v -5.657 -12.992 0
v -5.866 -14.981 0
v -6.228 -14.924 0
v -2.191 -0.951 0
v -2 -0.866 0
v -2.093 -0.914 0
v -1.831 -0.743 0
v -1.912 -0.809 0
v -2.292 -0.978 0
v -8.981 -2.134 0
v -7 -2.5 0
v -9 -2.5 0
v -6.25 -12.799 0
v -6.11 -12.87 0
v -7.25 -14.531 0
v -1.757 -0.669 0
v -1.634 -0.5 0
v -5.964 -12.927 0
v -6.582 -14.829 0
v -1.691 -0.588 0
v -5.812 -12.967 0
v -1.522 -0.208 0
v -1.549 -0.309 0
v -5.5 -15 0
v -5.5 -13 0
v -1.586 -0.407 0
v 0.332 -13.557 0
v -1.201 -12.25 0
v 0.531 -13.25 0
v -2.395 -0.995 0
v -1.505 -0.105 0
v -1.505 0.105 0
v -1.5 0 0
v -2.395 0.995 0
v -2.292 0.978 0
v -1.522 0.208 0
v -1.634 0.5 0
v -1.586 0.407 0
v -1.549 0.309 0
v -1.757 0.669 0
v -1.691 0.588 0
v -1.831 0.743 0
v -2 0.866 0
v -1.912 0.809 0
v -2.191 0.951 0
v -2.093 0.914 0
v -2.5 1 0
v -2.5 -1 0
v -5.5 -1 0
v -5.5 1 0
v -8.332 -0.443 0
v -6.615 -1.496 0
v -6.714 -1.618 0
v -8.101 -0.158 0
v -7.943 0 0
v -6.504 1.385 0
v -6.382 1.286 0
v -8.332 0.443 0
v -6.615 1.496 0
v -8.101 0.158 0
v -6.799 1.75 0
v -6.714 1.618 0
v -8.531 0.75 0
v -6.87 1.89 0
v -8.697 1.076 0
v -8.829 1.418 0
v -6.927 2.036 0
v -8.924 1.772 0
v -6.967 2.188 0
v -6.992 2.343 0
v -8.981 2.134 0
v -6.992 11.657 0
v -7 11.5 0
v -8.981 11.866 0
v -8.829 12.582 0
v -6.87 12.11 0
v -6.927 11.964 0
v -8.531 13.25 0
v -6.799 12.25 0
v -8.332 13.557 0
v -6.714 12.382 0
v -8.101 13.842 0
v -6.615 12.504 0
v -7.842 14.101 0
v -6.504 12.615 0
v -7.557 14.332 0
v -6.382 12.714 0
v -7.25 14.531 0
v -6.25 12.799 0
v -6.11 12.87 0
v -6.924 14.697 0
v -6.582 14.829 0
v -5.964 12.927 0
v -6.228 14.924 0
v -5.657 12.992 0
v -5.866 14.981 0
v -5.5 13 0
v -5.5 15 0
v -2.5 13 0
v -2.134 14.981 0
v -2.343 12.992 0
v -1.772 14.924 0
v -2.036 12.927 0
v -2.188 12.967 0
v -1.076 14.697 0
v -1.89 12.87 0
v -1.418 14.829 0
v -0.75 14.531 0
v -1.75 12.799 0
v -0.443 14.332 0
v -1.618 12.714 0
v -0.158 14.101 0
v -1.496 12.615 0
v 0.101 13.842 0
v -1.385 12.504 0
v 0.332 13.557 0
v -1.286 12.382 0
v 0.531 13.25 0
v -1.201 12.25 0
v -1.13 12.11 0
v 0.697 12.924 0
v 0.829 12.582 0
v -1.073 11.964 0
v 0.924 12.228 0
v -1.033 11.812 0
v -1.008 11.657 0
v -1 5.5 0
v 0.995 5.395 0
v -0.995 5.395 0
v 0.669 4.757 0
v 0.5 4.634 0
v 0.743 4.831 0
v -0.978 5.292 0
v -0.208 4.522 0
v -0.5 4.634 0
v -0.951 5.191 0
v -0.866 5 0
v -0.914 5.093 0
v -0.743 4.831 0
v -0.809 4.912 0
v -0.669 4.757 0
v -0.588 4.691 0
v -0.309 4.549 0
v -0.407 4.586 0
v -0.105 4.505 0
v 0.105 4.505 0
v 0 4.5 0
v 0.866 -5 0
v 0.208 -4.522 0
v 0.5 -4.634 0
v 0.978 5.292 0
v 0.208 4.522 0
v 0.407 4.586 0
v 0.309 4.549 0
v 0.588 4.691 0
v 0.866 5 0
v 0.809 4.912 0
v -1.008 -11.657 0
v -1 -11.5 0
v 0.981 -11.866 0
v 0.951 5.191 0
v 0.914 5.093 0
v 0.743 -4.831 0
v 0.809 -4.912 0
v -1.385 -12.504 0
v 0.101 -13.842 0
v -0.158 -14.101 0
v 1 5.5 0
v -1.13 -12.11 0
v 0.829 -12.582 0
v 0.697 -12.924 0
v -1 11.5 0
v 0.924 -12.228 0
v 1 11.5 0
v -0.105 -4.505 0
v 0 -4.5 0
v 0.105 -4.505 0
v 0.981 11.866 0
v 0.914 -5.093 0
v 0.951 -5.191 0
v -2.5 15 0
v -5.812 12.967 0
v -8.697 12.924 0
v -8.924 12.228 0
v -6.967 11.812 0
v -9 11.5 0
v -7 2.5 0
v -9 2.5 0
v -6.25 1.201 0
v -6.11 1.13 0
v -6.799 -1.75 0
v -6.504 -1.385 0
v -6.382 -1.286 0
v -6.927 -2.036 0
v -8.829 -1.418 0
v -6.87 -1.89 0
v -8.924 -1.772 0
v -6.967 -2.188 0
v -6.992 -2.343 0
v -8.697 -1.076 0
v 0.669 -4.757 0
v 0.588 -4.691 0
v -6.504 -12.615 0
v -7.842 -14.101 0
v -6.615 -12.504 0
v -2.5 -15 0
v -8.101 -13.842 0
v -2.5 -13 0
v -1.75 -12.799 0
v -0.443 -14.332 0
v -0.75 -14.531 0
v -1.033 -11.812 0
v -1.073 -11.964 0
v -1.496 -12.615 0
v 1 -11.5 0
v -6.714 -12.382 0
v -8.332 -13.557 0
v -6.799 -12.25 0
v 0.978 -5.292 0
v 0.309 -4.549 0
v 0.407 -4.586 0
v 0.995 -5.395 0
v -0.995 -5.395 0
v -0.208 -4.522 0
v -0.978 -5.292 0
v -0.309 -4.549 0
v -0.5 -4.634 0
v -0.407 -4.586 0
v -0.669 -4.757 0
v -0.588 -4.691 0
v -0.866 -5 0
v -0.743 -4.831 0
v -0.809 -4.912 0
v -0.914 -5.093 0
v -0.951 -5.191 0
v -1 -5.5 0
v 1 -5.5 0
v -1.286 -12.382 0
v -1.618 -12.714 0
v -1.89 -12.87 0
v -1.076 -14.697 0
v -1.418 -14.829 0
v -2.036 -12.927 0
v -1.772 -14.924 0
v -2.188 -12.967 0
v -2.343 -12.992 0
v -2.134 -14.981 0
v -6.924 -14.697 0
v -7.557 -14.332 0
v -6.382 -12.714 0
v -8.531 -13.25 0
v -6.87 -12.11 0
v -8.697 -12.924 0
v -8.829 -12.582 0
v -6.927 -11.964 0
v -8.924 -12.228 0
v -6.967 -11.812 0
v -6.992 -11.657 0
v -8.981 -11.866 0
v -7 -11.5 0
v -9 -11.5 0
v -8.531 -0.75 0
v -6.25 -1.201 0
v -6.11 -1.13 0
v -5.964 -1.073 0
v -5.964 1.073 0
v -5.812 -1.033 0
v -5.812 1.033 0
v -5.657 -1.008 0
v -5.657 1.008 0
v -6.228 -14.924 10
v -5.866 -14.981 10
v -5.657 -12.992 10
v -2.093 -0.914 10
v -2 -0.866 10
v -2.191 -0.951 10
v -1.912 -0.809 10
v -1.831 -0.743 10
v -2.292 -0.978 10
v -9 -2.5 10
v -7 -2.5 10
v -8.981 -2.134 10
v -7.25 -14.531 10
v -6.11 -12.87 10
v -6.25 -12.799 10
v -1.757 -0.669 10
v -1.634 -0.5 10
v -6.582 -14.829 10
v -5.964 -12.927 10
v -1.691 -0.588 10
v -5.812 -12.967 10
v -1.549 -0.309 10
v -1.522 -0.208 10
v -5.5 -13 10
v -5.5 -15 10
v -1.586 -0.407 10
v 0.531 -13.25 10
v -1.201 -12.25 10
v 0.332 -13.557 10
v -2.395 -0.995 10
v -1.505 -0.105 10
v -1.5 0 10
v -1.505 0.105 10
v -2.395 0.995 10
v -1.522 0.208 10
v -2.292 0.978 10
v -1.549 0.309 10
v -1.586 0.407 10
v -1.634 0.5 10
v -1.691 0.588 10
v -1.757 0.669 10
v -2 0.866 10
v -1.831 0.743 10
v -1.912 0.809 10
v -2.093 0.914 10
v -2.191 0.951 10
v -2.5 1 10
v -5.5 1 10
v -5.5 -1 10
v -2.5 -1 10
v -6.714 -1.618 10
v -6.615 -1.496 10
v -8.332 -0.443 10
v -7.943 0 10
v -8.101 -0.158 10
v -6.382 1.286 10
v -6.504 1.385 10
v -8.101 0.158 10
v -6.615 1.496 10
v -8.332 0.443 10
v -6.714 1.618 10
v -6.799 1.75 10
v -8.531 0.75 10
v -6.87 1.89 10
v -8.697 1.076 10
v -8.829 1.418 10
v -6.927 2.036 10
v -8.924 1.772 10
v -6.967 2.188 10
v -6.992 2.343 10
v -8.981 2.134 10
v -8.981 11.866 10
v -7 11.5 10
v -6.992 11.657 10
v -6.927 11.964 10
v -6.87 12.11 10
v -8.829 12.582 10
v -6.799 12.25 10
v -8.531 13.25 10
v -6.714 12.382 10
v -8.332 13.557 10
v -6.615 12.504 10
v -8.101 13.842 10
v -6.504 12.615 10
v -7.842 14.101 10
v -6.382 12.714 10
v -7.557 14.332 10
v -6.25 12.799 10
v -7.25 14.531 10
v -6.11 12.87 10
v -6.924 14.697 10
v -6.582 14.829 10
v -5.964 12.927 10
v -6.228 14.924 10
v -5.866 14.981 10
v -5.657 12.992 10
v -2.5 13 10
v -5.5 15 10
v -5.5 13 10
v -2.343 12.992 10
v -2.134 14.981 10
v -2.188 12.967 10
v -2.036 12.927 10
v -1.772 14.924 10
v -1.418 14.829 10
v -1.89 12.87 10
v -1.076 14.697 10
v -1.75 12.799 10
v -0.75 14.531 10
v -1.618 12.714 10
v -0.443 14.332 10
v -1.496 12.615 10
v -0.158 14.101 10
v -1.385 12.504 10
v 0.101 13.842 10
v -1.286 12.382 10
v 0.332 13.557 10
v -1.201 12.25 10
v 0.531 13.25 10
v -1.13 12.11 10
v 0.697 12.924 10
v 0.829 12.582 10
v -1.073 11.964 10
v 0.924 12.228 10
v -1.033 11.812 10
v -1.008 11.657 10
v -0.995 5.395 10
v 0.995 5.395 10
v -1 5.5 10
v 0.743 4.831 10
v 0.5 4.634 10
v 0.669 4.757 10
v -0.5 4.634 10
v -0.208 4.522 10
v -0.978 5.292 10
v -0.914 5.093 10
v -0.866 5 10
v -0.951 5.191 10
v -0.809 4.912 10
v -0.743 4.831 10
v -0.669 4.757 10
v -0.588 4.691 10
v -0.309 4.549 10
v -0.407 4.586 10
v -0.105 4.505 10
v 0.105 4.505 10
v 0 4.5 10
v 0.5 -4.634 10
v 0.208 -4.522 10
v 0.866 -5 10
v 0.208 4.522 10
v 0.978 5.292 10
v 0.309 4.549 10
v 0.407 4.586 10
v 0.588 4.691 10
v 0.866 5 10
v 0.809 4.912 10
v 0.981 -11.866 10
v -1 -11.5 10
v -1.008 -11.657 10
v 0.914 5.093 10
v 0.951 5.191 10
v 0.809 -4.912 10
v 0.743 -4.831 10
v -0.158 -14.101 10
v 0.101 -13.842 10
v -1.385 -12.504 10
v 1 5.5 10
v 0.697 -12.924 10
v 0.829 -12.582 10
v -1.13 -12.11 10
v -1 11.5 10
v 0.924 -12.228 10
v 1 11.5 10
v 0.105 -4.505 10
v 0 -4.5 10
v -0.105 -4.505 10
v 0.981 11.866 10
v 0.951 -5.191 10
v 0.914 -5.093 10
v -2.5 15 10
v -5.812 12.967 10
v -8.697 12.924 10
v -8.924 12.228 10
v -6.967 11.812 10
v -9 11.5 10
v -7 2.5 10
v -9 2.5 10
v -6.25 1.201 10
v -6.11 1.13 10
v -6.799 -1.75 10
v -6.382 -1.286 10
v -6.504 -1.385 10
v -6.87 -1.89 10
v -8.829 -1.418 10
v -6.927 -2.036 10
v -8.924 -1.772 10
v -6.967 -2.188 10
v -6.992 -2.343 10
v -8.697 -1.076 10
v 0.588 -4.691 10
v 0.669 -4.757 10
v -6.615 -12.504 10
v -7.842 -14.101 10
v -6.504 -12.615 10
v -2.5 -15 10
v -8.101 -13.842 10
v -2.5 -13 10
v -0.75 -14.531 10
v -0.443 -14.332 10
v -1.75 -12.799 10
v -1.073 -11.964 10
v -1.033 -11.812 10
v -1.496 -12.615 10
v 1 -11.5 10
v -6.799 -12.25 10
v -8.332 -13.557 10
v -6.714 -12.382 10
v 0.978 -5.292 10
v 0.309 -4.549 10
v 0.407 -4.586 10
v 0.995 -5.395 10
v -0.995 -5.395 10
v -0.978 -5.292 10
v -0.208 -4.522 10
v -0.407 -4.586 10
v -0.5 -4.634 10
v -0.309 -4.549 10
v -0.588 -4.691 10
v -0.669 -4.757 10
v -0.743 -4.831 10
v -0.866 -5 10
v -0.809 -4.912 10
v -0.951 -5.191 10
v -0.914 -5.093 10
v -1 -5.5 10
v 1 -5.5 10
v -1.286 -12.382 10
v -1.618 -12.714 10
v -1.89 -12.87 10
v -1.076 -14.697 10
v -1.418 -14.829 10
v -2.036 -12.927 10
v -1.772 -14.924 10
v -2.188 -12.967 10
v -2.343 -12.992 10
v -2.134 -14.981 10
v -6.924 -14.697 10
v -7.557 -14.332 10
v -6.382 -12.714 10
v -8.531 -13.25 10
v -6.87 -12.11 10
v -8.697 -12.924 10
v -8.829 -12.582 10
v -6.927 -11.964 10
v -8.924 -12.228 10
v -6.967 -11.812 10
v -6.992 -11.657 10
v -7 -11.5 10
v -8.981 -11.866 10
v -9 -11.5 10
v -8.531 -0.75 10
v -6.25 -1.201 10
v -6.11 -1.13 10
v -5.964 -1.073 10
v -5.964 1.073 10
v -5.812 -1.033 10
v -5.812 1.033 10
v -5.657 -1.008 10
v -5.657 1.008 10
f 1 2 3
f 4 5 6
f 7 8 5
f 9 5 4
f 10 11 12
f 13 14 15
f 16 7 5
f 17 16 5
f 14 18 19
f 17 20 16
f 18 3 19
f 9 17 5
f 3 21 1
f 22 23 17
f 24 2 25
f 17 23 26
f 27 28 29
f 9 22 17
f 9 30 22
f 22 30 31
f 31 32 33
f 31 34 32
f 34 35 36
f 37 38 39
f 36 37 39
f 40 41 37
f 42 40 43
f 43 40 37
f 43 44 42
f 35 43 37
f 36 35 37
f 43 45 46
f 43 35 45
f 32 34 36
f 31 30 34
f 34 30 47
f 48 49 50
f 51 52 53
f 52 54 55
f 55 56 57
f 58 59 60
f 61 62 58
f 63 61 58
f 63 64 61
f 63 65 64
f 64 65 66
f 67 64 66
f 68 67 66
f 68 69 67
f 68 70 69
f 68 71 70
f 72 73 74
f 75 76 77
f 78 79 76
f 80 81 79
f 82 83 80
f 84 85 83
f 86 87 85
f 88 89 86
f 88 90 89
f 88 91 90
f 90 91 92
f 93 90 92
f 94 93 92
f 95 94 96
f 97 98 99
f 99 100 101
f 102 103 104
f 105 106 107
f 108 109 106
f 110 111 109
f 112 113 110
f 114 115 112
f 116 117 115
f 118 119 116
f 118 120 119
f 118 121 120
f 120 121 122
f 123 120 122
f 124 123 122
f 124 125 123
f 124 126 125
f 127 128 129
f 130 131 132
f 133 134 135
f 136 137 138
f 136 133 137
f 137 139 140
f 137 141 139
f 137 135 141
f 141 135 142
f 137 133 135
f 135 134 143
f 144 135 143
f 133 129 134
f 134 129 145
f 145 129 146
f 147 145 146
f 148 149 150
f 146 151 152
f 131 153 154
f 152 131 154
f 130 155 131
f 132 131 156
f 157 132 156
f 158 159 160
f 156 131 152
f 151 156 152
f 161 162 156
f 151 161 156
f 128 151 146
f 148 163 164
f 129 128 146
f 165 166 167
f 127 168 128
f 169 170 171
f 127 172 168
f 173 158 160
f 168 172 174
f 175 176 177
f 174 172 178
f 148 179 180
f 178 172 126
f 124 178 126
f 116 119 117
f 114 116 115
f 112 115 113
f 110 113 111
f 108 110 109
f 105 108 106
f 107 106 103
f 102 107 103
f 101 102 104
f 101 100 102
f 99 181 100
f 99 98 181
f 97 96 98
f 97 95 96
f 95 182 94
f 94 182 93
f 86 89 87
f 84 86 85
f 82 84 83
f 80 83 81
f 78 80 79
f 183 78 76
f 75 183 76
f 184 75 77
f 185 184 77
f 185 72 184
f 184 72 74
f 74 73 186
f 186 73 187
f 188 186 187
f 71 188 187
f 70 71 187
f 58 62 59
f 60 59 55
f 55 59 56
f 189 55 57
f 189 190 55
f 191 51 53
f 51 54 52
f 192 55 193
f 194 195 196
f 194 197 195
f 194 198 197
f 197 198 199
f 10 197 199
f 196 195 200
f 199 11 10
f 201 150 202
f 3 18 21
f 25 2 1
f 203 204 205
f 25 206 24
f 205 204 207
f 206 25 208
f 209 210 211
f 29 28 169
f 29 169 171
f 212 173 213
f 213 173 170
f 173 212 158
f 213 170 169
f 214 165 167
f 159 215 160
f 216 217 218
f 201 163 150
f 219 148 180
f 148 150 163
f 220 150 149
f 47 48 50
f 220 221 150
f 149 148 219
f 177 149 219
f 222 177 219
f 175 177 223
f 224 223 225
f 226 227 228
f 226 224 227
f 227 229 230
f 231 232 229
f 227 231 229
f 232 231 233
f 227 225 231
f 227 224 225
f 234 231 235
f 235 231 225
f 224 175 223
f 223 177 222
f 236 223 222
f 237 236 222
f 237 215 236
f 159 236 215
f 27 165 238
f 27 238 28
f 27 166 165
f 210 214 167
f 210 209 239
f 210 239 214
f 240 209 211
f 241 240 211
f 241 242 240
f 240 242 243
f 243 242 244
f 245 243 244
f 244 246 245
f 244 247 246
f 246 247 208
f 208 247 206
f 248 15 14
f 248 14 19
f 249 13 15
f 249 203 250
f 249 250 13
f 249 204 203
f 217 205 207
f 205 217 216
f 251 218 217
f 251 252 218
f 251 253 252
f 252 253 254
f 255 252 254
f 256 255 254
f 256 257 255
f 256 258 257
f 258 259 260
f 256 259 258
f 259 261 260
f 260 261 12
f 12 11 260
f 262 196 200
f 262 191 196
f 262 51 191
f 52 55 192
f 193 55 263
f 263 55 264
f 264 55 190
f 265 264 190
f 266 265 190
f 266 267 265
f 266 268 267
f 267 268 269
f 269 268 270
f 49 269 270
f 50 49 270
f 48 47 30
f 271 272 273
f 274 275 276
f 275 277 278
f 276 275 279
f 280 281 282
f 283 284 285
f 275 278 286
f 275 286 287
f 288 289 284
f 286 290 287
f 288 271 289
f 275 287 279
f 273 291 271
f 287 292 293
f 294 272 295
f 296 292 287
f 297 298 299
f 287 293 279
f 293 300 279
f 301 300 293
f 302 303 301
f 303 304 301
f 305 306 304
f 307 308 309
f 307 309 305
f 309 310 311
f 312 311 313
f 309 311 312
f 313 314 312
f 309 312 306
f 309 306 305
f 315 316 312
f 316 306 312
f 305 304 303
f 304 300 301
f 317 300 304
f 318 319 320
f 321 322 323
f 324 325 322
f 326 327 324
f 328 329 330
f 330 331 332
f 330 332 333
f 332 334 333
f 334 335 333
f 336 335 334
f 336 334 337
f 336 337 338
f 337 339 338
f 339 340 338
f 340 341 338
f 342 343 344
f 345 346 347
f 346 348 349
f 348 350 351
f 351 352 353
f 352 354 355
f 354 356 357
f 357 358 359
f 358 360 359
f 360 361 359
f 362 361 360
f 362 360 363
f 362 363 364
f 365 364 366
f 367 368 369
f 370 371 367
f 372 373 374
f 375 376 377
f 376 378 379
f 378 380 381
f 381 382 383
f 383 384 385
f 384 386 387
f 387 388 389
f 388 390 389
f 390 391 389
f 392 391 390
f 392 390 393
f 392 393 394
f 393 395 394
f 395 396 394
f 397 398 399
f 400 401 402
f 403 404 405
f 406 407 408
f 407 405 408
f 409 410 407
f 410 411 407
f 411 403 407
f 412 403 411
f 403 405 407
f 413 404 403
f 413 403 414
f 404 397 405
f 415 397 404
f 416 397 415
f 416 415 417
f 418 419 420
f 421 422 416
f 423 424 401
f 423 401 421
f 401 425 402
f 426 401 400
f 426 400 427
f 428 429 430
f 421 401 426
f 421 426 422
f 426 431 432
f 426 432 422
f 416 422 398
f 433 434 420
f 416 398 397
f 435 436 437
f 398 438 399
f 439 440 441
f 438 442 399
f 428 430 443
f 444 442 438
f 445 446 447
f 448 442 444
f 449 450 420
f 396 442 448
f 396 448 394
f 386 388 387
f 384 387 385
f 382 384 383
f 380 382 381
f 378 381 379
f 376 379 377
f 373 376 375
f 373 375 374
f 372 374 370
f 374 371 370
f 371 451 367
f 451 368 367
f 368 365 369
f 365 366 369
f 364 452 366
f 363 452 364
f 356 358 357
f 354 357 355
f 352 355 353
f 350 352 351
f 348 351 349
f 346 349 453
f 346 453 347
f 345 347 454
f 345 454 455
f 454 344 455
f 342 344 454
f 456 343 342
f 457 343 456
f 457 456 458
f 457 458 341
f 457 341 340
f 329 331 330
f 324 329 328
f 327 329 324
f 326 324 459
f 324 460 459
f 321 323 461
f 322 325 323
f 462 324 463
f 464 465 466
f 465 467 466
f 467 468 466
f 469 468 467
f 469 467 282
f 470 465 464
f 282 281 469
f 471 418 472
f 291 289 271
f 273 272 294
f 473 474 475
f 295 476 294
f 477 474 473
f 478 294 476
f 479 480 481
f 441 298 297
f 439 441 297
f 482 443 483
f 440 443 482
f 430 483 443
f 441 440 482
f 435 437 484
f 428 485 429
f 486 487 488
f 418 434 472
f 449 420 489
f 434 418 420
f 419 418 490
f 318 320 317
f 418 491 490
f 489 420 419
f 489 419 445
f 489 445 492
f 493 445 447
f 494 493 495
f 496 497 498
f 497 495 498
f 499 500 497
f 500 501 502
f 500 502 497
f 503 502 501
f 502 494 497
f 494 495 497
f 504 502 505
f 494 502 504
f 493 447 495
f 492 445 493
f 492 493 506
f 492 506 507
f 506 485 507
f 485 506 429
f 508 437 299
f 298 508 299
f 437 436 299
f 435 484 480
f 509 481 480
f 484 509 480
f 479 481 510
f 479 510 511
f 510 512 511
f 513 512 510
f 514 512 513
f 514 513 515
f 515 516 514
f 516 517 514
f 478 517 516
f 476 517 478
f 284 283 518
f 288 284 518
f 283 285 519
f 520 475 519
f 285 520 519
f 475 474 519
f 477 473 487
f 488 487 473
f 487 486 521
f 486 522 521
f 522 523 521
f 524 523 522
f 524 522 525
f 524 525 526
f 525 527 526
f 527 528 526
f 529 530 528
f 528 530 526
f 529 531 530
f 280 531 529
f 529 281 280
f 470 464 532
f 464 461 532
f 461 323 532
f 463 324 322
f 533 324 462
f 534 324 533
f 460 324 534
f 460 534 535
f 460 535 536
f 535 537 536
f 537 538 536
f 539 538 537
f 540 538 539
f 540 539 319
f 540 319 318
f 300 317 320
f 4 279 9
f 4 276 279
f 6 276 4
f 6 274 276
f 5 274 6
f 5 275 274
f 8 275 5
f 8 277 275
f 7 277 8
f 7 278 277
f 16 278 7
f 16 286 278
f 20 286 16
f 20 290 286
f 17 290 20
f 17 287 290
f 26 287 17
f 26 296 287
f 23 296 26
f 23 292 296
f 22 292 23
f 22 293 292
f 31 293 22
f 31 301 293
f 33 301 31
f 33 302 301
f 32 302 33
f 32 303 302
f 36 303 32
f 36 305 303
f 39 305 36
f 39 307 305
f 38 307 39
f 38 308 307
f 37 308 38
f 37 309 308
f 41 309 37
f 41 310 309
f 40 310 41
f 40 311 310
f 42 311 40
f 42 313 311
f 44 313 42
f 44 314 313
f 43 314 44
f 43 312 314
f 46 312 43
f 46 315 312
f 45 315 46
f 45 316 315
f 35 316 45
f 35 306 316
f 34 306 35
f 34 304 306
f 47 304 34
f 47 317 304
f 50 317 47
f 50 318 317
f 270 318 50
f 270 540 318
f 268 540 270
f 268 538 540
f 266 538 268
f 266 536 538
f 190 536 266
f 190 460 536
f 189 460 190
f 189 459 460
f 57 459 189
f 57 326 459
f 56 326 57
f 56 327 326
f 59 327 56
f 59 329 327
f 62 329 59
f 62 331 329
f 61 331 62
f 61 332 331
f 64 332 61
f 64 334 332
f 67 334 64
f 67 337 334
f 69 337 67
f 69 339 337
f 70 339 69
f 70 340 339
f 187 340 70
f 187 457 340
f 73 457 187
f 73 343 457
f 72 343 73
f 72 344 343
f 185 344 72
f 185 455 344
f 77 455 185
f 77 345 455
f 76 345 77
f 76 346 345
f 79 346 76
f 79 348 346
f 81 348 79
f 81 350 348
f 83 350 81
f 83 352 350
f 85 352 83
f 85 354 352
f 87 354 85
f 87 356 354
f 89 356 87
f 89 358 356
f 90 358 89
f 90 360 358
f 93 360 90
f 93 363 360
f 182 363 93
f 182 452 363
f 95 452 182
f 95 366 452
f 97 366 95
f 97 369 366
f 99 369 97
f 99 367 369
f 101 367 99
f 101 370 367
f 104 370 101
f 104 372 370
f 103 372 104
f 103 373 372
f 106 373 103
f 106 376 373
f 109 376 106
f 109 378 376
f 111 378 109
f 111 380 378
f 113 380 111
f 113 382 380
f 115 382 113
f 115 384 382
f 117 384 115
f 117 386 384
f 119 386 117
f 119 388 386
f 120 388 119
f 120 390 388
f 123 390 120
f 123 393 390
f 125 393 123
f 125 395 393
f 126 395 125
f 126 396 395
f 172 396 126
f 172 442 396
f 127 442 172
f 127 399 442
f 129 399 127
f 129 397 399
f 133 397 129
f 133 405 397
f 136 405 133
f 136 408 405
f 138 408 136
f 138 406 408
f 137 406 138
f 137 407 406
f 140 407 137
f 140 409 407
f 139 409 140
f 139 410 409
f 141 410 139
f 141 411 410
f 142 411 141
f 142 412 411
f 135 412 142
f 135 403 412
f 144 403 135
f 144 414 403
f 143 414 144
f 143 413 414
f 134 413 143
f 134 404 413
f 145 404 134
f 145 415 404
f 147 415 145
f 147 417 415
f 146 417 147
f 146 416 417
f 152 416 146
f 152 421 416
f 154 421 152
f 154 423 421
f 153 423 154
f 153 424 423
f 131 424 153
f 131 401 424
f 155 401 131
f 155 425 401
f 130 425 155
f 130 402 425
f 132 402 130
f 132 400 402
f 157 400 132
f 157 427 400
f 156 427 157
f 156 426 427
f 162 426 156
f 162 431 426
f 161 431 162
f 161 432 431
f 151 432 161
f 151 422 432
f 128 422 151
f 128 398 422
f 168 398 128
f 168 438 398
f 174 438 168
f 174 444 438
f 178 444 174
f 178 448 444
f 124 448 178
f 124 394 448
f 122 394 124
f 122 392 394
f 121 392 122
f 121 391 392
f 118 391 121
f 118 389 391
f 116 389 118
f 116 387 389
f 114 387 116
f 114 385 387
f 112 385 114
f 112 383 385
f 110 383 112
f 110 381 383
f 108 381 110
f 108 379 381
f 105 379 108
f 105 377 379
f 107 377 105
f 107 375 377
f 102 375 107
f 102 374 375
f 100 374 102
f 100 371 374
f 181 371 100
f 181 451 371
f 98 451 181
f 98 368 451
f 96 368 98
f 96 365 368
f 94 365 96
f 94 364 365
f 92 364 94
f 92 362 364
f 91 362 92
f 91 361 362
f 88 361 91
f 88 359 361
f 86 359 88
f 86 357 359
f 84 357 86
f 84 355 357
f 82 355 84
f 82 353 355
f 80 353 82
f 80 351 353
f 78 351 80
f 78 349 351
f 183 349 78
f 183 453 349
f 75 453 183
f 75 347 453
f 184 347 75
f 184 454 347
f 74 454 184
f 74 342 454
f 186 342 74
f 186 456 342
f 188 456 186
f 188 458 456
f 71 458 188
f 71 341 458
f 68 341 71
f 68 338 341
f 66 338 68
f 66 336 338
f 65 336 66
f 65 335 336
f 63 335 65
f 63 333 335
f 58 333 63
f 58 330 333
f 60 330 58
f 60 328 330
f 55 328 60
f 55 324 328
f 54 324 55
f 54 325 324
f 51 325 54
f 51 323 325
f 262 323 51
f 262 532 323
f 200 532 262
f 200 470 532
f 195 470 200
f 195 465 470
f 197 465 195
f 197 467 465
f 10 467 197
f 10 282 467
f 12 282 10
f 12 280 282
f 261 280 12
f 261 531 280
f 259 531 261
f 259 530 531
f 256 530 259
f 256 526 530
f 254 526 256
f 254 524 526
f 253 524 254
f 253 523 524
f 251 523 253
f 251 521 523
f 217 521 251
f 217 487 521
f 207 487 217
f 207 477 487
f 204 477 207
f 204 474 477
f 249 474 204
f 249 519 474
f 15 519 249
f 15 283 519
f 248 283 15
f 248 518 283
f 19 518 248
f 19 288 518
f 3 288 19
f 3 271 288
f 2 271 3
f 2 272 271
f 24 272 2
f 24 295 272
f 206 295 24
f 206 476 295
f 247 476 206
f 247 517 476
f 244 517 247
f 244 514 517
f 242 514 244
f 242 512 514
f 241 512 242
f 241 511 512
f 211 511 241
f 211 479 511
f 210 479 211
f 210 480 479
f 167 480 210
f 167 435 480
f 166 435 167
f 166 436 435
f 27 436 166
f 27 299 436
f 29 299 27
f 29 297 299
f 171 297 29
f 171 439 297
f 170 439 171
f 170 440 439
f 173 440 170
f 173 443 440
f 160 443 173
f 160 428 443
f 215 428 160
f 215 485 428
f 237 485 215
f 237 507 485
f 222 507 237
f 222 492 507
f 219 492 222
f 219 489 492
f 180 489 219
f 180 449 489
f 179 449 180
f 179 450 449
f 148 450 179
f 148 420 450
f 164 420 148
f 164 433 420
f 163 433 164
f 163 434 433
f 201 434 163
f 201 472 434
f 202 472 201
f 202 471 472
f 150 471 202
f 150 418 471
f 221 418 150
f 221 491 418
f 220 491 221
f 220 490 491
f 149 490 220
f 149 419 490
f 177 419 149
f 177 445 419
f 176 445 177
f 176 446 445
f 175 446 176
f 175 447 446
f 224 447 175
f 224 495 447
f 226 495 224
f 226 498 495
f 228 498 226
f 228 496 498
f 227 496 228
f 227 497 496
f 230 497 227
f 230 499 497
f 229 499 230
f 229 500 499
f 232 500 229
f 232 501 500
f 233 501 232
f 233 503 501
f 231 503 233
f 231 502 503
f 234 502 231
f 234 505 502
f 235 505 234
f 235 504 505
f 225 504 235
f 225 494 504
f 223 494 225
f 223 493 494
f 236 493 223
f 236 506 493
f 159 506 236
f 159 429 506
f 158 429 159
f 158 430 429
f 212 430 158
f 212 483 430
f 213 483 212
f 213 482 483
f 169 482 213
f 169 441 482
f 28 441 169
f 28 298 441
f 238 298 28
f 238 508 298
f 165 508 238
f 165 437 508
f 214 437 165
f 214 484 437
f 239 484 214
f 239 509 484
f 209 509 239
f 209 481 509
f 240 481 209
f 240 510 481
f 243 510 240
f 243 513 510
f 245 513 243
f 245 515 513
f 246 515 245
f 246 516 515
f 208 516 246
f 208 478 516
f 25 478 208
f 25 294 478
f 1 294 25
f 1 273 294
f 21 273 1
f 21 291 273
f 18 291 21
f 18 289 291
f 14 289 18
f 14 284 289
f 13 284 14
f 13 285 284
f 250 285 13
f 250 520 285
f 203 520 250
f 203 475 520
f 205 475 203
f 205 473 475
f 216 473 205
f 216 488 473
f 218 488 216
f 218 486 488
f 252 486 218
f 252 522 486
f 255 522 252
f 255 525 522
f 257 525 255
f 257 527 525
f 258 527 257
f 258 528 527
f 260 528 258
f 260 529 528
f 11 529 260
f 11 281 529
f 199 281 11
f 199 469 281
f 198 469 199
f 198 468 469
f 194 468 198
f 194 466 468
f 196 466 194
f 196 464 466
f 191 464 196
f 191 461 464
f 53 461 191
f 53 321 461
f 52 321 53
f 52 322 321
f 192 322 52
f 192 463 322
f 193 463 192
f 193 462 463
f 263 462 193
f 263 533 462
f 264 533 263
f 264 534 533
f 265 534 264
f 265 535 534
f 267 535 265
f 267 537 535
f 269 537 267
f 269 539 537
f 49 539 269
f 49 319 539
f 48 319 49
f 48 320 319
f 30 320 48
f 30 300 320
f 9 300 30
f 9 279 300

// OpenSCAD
// ------------------
// Dec 2023 - Cubic8
// ------------------

/* [Cable Details] */

// Diameter of the cable in mm
cable_diameter = 3.0; // [1:0.1:6]

// Maximum loops of the cable that the clip is to hold
cable_max_loops = 4; // [2:1:20]

/* [Clip Dimentions] */

// Overall height of the clip in mm (ie. when printed on its edge)
clip_height = 10.0; // [1:1:50]

// Maximum outer width of clip in mm (ie. across the loops of cable). The depth will be adjusted to fit your required loops.
max_width = 30; // [20:0.5:80]

// Check if using flex filament. The cable gap will be smaller, and walls thicker.
using_flex = false;

// Check if the central space is to be a clip to grip onto the cable.
cable_grip = false;

/* [Hidden] */

// Thickness of walls in mm
// FLEX needs thicker walls
base_thickness = using_flex ? 2.0: 1.0;

// Add extra if we have a bigger clip
wall_thickness = base_thickness 
    + round(0.5 
        + (cable_diameter * cable_max_loops) / 50.0
    );
echo("wall_thickness", wall_thickness);

// Depth is calculated from cable size and loops needed
loop_num_bottom = max(2, round(0.5 + 
       (max_width/2 - wall_thickness * 1.5) /
        cable_diameter
    ));

internal_depth = (round(0.5 +(cable_max_loops / loop_num_bottom)) + 1)
       * cable_diameter;
       
outer_depth = internal_depth + wall_thickness*2;

// No-Corner dimentions
depth_nc = internal_depth - cable_diameter;
half_width_nc = (max_width/2 - wall_thickness * 1.5) - cable_diameter; 
top_half_width_nc = 
    using_flex ? 
        half_width_nc - cable_diameter/4 :
        half_width_nc - cable_diameter;

echo("loop_num_bottom", loop_num_bottom);
echo("internal_depth", internal_depth);
echo("outer_depth", outer_depth);
echo("depth_nc", depth_nc);
echo("half_width_nc", half_width_nc);
echo("top_half_width_nc", top_half_width_nc);

$fn = 60;

assert(loop_num_bottom > 1, "Expect bottom width to be over 1 mm");
assert(half_width_nc > 0, "Must be able to fit one cable dia across bottom.  Increase Max-Width");
assert(top_half_width_nc > 0, "Must have enough width to fit cable through. Increase Max-Width");

module corner_section(r)
{
    rotate([0,0,r])
    {
        intersection()
        {
            difference()
            {
                circle(cable_diameter/2 + wall_thickness);
                circle(cable_diameter/2);
            }
            square(cable_diameter/2 + wall_thickness);
        }
    }
}

module end_section(r)
{
    rotate([0,0,r])
    {
        intersection()
        {
            circle(wall_thickness/2);
            translate([wall_thickness/2,0,0])
                square(wall_thickness, center=true);
        }
    }
}

module half_section_squ()
{
    corneradj = (cable_diameter+wall_thickness)/2;
    
    translate([0,-half_width_nc-wall_thickness/2-cable_diameter/2,0])
    {
        translate([-corneradj,-corneradj,0])
        {
            translate([-depth_nc,0,0])
            {
                translate([-corneradj,corneradj,0])
                {
                    translate([0,half_width_nc,0])
                    {
                        translate([
                            (depth_nc+cable_diameter+wall_thickness)/2,
                            corneradj,
                            0
                        ])
                        {
                            square([depth_nc, wall_thickness], center = true);
                            translate([depth_nc/2,0,0]) end_section(0);
                            translate([
                                -depth_nc/2,
                                -corneradj,
                                0]) corner_section(90);
                        }
                        
                        translate([0,-half_width_nc/2,0])
                        {
                            square([wall_thickness, half_width_nc], center = true);
                        }
                    }
                    translate([corneradj,0,0]){
                        corner_section(180);
                    }
                }
                translate([depth_nc/2,0,0])
                {
                    square([depth_nc, wall_thickness], center = true);
                }
            }
            translate([0,corneradj,0])
            {
                corner_section(270);
            }
        }
        translate([0, top_half_width_nc/2, 0])
        {
            square([wall_thickness, top_half_width_nc], center = true);
        }
        translate([0,top_half_width_nc,0]) end_section(90);
    }
}

linear_extrude(clip_height)
{
    if (cable_grip)
    {
        grip_scale = [1,using_flex ? 1.3 : 1,1];
        grip_indent_factor = 0.15;
        offset = (cable_diameter + wall_thickness)/2;
        translate([0,-offset,0])
        {   
            half_section_squ();
            translate([-cable_diameter,cable_diameter*grip_indent_factor,0])
                scale(grip_scale)
                    end_section(90);
        }
        mirror([0,1,0]) translate([0,-offset,0])
        {
            half_section_squ();
            translate([-cable_diameter,cable_diameter*grip_indent_factor,0])
                scale(grip_scale)
                    end_section(90);
        }
        translate([-internal_depth,0,0])
        {
            corner_section(180);
            corner_section(90);
        }
        
    }
    else
    {
        half_section_squ();
        mirror([0,1,0]) half_section_squ();
    }
}
